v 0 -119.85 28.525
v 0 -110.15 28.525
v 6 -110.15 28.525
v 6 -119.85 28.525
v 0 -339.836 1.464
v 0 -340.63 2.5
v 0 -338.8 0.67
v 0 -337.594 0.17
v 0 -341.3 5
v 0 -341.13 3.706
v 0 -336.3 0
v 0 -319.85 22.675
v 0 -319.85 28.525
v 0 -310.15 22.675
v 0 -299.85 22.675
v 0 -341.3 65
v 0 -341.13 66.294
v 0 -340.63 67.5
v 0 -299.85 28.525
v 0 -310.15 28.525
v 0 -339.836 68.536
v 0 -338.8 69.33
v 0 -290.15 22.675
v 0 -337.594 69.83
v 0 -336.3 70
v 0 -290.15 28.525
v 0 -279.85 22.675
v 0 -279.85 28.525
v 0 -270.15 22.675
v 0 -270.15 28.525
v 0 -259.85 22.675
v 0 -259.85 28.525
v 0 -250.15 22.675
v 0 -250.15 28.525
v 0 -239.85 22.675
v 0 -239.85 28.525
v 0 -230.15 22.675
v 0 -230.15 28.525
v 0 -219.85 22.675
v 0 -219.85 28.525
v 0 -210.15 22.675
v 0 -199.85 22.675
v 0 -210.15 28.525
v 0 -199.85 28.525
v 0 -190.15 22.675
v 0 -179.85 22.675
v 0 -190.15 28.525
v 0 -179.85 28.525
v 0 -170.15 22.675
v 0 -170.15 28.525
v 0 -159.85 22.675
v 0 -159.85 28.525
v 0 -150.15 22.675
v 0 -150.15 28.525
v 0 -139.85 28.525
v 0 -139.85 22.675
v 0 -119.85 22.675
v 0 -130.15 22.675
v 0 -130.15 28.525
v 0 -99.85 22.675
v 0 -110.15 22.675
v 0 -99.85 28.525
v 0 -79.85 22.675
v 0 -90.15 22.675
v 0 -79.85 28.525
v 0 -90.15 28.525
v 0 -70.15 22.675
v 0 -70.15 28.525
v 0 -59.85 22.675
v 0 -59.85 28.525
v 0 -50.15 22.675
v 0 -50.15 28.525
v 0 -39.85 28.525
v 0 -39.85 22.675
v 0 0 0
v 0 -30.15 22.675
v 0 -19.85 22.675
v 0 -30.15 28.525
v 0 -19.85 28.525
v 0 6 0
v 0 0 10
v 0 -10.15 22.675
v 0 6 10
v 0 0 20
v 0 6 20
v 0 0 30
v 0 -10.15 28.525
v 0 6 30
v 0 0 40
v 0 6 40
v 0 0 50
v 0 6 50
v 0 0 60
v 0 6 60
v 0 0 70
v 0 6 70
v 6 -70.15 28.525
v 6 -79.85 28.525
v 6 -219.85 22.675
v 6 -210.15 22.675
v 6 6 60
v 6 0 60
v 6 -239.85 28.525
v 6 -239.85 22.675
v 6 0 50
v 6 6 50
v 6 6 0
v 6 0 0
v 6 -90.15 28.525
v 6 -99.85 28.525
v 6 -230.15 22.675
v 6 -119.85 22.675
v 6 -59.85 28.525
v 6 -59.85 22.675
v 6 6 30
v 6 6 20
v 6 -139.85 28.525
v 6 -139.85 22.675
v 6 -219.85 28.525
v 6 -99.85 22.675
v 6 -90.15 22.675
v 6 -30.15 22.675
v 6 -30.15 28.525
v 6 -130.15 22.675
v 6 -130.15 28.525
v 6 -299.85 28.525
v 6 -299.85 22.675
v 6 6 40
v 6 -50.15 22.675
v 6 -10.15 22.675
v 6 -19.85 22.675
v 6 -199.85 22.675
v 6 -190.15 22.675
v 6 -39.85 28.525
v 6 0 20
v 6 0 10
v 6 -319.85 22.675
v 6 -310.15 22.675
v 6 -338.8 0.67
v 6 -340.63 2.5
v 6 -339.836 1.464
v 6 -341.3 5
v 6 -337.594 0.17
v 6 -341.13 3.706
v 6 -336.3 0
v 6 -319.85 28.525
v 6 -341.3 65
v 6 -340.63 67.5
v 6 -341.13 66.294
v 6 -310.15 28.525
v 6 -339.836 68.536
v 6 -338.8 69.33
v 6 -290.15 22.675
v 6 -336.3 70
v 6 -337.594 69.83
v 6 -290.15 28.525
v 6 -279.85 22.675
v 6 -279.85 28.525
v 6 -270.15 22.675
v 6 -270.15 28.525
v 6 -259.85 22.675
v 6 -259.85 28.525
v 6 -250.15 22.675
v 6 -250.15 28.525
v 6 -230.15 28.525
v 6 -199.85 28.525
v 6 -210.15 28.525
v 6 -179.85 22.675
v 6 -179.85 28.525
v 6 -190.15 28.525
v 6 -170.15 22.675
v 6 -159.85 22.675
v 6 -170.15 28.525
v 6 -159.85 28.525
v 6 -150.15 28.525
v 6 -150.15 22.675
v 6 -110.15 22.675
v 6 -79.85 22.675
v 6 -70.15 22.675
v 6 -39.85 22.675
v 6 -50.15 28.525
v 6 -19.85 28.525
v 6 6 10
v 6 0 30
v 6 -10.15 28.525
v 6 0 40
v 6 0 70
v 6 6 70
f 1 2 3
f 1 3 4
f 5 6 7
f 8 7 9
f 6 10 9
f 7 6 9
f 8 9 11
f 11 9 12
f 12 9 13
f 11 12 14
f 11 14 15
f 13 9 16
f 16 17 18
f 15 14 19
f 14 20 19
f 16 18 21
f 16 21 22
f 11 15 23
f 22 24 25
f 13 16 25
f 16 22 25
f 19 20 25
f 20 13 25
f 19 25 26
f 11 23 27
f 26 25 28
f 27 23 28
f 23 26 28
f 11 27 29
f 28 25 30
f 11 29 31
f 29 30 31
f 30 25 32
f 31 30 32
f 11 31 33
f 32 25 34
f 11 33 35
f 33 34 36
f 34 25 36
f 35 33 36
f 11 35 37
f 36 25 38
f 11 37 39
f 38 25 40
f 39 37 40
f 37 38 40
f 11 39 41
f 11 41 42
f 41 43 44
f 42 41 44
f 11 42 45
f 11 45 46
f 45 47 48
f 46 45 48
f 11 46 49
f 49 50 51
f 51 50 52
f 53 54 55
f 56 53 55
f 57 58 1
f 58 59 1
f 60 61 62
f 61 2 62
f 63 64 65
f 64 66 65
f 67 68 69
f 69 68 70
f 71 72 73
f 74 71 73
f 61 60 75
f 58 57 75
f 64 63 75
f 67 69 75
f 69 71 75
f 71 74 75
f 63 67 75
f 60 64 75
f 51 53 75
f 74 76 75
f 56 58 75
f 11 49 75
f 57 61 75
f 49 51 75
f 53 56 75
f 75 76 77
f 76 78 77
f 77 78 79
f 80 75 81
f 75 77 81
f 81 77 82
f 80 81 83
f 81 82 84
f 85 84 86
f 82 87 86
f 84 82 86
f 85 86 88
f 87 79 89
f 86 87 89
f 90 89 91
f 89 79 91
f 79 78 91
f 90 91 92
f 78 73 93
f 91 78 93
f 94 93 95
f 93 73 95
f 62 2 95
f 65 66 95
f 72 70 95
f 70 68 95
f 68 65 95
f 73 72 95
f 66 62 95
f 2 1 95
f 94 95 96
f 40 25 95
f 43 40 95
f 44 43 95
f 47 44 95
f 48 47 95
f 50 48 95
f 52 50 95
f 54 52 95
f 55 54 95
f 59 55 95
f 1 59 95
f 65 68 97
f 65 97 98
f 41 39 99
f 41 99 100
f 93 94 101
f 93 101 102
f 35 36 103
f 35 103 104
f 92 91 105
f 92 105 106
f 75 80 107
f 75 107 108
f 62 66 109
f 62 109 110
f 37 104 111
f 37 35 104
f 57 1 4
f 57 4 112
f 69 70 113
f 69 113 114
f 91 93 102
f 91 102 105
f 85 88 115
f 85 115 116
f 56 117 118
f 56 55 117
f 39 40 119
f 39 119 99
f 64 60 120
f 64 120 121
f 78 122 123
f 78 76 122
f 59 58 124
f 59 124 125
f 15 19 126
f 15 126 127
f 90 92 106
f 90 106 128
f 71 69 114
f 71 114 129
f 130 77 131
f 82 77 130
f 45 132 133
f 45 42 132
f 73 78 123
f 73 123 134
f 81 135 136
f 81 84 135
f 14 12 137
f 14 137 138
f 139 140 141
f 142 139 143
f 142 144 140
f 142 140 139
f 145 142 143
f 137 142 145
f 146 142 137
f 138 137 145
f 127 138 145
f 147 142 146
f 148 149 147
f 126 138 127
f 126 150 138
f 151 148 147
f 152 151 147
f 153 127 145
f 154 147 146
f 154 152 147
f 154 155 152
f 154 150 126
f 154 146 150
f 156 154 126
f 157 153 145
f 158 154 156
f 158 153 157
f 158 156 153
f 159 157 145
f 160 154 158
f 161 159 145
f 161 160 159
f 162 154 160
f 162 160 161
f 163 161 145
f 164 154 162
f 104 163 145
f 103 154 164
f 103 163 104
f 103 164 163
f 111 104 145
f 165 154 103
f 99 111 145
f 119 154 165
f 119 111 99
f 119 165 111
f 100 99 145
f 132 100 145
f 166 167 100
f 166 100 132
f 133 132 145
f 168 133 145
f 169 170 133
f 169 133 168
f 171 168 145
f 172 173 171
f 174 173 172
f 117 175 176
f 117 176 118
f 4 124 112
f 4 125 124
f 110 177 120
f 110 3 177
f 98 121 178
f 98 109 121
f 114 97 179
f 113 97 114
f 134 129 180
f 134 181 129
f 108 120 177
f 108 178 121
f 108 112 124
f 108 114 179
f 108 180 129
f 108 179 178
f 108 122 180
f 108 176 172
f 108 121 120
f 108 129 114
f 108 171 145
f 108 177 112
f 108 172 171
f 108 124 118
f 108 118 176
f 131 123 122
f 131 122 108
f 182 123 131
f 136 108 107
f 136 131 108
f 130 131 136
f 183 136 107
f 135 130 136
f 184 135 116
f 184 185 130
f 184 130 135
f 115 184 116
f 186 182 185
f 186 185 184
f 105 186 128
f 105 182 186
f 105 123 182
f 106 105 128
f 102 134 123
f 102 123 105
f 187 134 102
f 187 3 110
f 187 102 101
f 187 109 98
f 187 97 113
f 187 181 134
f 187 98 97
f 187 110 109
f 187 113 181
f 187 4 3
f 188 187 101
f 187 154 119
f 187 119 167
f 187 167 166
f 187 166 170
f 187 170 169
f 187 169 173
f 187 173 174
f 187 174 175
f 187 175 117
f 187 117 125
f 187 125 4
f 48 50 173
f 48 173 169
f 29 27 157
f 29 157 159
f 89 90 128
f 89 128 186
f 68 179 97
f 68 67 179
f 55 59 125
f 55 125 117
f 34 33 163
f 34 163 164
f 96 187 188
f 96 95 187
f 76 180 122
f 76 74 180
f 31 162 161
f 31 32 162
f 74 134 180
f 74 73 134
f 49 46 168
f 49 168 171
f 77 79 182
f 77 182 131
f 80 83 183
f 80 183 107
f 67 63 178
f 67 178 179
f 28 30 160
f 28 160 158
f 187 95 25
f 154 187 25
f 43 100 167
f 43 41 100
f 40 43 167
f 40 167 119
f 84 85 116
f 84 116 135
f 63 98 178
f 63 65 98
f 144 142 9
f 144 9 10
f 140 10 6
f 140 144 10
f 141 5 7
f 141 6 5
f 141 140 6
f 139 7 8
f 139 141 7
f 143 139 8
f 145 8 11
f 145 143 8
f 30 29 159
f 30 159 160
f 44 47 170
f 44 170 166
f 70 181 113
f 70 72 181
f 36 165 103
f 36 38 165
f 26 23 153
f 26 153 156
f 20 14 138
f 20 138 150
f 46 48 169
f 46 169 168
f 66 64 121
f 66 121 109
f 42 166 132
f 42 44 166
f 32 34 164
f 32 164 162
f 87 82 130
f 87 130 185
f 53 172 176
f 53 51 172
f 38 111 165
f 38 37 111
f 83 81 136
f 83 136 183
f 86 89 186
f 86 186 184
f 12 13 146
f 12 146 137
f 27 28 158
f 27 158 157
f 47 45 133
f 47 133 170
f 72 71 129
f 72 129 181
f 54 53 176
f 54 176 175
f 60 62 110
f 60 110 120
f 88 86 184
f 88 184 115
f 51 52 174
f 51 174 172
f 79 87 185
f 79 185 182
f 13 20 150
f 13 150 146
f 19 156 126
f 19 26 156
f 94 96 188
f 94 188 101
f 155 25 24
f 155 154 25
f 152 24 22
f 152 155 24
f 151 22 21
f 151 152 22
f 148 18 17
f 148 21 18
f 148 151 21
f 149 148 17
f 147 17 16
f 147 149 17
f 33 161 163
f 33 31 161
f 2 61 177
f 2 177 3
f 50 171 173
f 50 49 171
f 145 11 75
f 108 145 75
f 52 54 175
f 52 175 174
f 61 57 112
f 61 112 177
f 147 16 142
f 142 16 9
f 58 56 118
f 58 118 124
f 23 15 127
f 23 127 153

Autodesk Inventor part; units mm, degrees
ref_plane "YZ Plane" through (0, 0, 0) normal (1, 0, 0) x (0, 1, 0)
ref_plane "XZ Plane" through (0, 0, 0) normal (0, 1, 0) x (-1, 0, 0)
ref_plane "XY Plane" through (0, 0, 0) normal (0, 0, 1) x (1, 0, 0)
sketch "Sketch1" plane through (0, 0, 0) normal (1, 0, 0) x (0, 1, 0)
  line L0 (0, 70) -> (-341.3, 70)
  line L1 (-341.3, 70) -> (-341.3, 0)
  line L2 (-341.3, 0) -> (0, 0)
  line L3 (0, 0) -> (0, 60) construction
  line L4 (0, 70) -> (6, 70)
  line L5 (6, 70) -> (6, 60)
  line L6 (6, 60) -> (0, 60)
  line L7 (0, 50) -> (6, 50)
  line L8 (6, 50) -> (6, 40)
  line L9 (6, 40) -> (0, 40)
  line L10 (0, 30) -> (6, 30)
  line L11 (6, 30) -> (6, 20)
  line L12 (6, 20) -> (0, 20)
  line L13 (0, 10) -> (6, 10)
  line L14 (6, 10) -> (6, 0)
  line L15 (6, 0) -> (0, 0)
  line L16 (0, 60) -> (0, 50)
  line L17 (0, 40) -> (0, 30)
  line L18 (0, 20) -> (0, 10)
  line L19 (-10.15, 28.525) -> (-19.85, 28.525)
  line L20 (-19.85, 28.525) -> (-19.85, 22.675)
  line L21 (-19.85, 22.675) -> (-10.15, 22.675)
  line L22 (-10.15, 22.675) -> (-10.15, 28.525)
  line L23 (-10, 28.6) -> (-331.3, 28.6) construction
  line L24 (-331.3, 28.6) -> (-331.3, 22.6) construction
  line L25 (-331.3, 22.6) -> (-10, 22.6) construction
  line L26 (-10, 22.6) -> (-10, 28.6) construction
  line L27 (-15, 28.6) -> (-15, 22.6) construction
  line L28 (-30.15, 22.675) -> (-30.15, 28.525)
  line L29 (-30.15, 28.525) -> (-39.85, 28.525)
  line L30 (-39.85, 22.675) -> (-30.15, 22.675)
  line L31 (-39.85, 28.525) -> (-39.85, 22.675)
  line L32 (-50.15, 22.675) -> (-50.15, 28.525)
  line L33 (-50.15, 28.525) -> (-59.85, 28.525)
  line L34 (-59.85, 22.675) -> (-50.15, 22.675)
  line L35 (-59.85, 28.525) -> (-59.85, 22.675)
  line L36 (-70.15, 22.675) -> (-70.15, 28.525)
  line L37 (-70.15, 28.525) -> (-79.85, 28.525)
  line L38 (-79.85, 22.675) -> (-70.15, 22.675)
  line L39 (-79.85, 28.525) -> (-79.85, 22.675)
  line L40 (-90.15, 22.675) -> (-90.15, 28.525)
  line L41 (-90.15, 28.525) -> (-99.85, 28.525)
  line L42 (-99.85, 22.675) -> (-90.15, 22.675)
  line L43 (-99.85, 28.525) -> (-99.85, 22.675)
  line L44 (-110.15, 22.675) -> (-110.15, 28.525)
  line L45 (-110.15, 28.525) -> (-119.85, 28.525)
  line L46 (-119.85, 22.675) -> (-110.15, 22.675)
  line L47 (-119.85, 28.525) -> (-119.85, 22.675)
  line L48 (-130.15, 22.675) -> (-130.15, 28.525)
  line L49 (-130.15, 28.525) -> (-139.85, 28.525)
  line L50 (-139.85, 22.675) -> (-130.15, 22.675)
  line L51 (-139.85, 28.525) -> (-139.85, 22.675)
  line L52 (-150.15, 22.675) -> (-150.15, 28.525)
  line L53 (-150.15, 28.525) -> (-159.85, 28.525)
  line L54 (-159.85, 22.675) -> (-150.15, 22.675)
  line L55 (-159.85, 28.525) -> (-159.85, 22.675)
  line L56 (-170.15, 22.675) -> (-170.15, 28.525)
  line L57 (-170.15, 28.525) -> (-179.85, 28.525)
  line L58 (-179.85, 22.675) -> (-170.15, 22.675)
  line L59 (-179.85, 28.525) -> (-179.85, 22.675)
  line L60 (-190.15, 22.675) -> (-190.15, 28.525)
  line L61 (-190.15, 28.525) -> (-199.85, 28.525)
  line L62 (-199.85, 22.675) -> (-190.15, 22.675)
  line L63 (-199.85, 28.525) -> (-199.85, 22.675)
  line L64 (-210.15, 22.675) -> (-210.15, 28.525)
  line L65 (-210.15, 28.525) -> (-219.85, 28.525)
  line L66 (-219.85, 22.675) -> (-210.15, 22.675)
  line L67 (-219.85, 28.525) -> (-219.85, 22.675)
  line L68 (-230.15, 22.675) -> (-230.15, 28.525)
  line L69 (-230.15, 28.525) -> (-239.85, 28.525)
  line L70 (-239.85, 22.675) -> (-230.15, 22.675)
  line L71 (-239.85, 28.525) -> (-239.85, 22.675)
  line L72 (-250.15, 22.675) -> (-250.15, 28.525)
  line L73 (-250.15, 28.525) -> (-259.85, 28.525)
  line L74 (-259.85, 22.675) -> (-250.15, 22.675)
  line L75 (-259.85, 28.525) -> (-259.85, 22.675)
  line L76 (-270.15, 22.675) -> (-270.15, 28.525)
  line L77 (-270.15, 28.525) -> (-279.85, 28.525)
  line L78 (-279.85, 22.675) -> (-270.15, 22.675)
  line L79 (-279.85, 28.525) -> (-279.85, 22.675)
  line L80 (-290.15, 22.675) -> (-290.15, 28.525)
  line L81 (-290.15, 28.525) -> (-299.85, 28.525)
  line L82 (-299.85, 22.675) -> (-290.15, 22.675)
  line L83 (-299.85, 28.525) -> (-299.85, 22.675)
  line L84 (-310.15, 22.675) -> (-310.15, 28.525)
  line L85 (-310.15, 28.525) -> (-319.85, 28.525)
  line L86 (-319.85, 22.675) -> (-310.15, 22.675)
  line L87 (-319.85, 28.525) -> (-319.85, 22.675)
  point P0 (0, 35)
  point P1 (-170.65, 0)
  point P2 (3, 70)
  point P3 (3, 50)
  point P4 (3, 30)
  point P5 (3, 10)
  point P6 (-10.15, 25.6)
  point P7 (-10, 25.6)
  point P8 (0, 35)
  point P9 (-15, 25.6)
  point P10 (-15, 22.675)
  point P11 (-30.15, 25.6)
  point P12 (-35, 22.675)
  point P13 (-50.15, 25.6)
  point P14 (-55, 22.675)
  point P15 (-70.15, 25.6)
  point P16 (-75, 22.675)
  point P17 (-90.15, 25.6)
  point P18 (-95, 22.675)
  point P19 (-110.15, 25.6)
  point P20 (-115, 22.675)
  point P21 (-130.15, 25.6)
  point P22 (-135, 22.675)
  point P23 (-150.15, 25.6)
  point P24 (-155, 22.675)
  point P25 (-170.15, 25.6)
  point P26 (-175, 22.675)
  point P27 (-190.15, 25.6)
  point P28 (-195, 22.675)
  point P29 (-210.15, 25.6)
  point P30 (-215, 22.675)
  point P31 (-230.15, 25.6)
  point P32 (-235, 22.675)
  point P33 (-250.15, 25.6)
  point P34 (-255, 22.675)
  point P35 (-270.15, 25.6)
  point P36 (-275, 22.675)
  point P37 (-290.15, 25.6)
  point P38 (-295, 22.675)
  point P39 (-310.15, 25.6)
  point P40 (-315, 22.675)
  dimension "d7" = 70
  dimension "d18" = 6
  dimension "d21" = 10
  dimension "d24" = 341.3
  dimension "d35" = 20
  dimension "d49" = 5.85
  dimension "d50" = 9.7
  dimension "d51" = 6
  dimension "d52" = 9.4
  dimension "d53" = 10
  dimension "d58" = 10
  dimension "d60" = 5
  dimension "d63" = 20
extrude "Extrusion1" add sketch "Sketch1" along normal blind 6
fillet "Fillet1" radius 5 2 edges at (3, -341.3, 70) (3, -341.3, 0)
equation "\"d7\" = moduleMountH"
equation "\"d18\" = fingerH"
equation "\"d21\" = fingerW"
equation "\"d24\" = supportL"
equation "\"d35\" = fingerSpacing"
equation "\"d49\" = fingerholeH"
equation "\"d50\" = fingerholeW"
equation "\"d51\" = thickness"
equation "\"d52\" = supportsCTCZ"
equation "\"d53\" = 0.5 * fingerSpacing"
equation "\"d58\" = 0.5 * fingerSpacing"
equation "\"d60\" = 0.5 * fingerW"
equation "\"d63\" = fingerSpacing"
equation "\"d44\" = thickness"
equation "\"d73\" = supportsFilletR"
equation "\"moduleWidth\" = 118"
equation "\"moduleHeight\" = 96"
equation "\"moduleMountH\" = 70"
equation "\"moduleMountD\" = 6.8"
equation "\"moduleCornerR\" = 5"
equation "\"d4\" = moduleCornerR"
equation "\"d5\" = moduleMountD"
equation "\"d6\" = moduleMountD"
equation "\"d8\" = moduleMountD"
equation "\"d10\" = moduleMountD"
equation "\"moduleOpeningR\" = 25"
equation "\"d13\" = moduleOpeningR"
equation "\"thickness\" = 6"
equation "\"d15\" = thickness"
equation "\"d16\" = 0"
equation "\"kerf\" = 0.15"
equation "\"fingerW\" = 10"
equation "\"fingerSpacing\" = 20"
equation "\"fingerholeW\" = fingerW - 2 * kerf"
equation "\"fingerholeH\" = thickness - kerf"
equation "\"moduleMountClearance\" = 19"
equation "\"actuatorW\" = 28"
equation "\"actuatorH\" = 40.8"
equation "\"openingMFC\" = 45"
equation "\"d28\" = thickness"
equation "\"d29\" = thickness"
equation "\"d30\" = 0.5 * actuatorH + thickness"
equation "\"d31\" = 15"
equation "\"d32\" = fingerholeH"
equation "\"d33\" = fingerholeW"
equation "\"d41\" = fingerholeH"
equation "\"d42\" = fingerholeW"
equation "\"chairThickness\" = 12.7"
equation "\"supportL\" = -chairThickness + dildoL + actuatorMountL - thickness"
equation "\"d0\" = moduleHeight"
equation "\"d1\" = moduleWidth"
equation "\"d17\" = openingMFC"
equation "\"d19\" = moduleMountClearance"
equation "\"fingerH\" = thickness"
equation "\"supportSpacingFromMounting\" = 15"
equation "\"d54\" = fingerholeH"
equation "\"d55\" = fingerholeW"
equation "\"d64\" = 9.4"
equation "\"supportsCTCZ\" = d64"
equation "\"supportXW\" = -2 * thickness + moduleMountW - 2 * supportSpacingFromMounting + kerf"
equation "\"supportsFilletR\" = 5"
equation "\"dildoL\" = 170"
equation "\"actuatorMountL\" = 190"
equation "\"moduleMountW\" = 100"
properties part number "Module_supportZ_MFC"
